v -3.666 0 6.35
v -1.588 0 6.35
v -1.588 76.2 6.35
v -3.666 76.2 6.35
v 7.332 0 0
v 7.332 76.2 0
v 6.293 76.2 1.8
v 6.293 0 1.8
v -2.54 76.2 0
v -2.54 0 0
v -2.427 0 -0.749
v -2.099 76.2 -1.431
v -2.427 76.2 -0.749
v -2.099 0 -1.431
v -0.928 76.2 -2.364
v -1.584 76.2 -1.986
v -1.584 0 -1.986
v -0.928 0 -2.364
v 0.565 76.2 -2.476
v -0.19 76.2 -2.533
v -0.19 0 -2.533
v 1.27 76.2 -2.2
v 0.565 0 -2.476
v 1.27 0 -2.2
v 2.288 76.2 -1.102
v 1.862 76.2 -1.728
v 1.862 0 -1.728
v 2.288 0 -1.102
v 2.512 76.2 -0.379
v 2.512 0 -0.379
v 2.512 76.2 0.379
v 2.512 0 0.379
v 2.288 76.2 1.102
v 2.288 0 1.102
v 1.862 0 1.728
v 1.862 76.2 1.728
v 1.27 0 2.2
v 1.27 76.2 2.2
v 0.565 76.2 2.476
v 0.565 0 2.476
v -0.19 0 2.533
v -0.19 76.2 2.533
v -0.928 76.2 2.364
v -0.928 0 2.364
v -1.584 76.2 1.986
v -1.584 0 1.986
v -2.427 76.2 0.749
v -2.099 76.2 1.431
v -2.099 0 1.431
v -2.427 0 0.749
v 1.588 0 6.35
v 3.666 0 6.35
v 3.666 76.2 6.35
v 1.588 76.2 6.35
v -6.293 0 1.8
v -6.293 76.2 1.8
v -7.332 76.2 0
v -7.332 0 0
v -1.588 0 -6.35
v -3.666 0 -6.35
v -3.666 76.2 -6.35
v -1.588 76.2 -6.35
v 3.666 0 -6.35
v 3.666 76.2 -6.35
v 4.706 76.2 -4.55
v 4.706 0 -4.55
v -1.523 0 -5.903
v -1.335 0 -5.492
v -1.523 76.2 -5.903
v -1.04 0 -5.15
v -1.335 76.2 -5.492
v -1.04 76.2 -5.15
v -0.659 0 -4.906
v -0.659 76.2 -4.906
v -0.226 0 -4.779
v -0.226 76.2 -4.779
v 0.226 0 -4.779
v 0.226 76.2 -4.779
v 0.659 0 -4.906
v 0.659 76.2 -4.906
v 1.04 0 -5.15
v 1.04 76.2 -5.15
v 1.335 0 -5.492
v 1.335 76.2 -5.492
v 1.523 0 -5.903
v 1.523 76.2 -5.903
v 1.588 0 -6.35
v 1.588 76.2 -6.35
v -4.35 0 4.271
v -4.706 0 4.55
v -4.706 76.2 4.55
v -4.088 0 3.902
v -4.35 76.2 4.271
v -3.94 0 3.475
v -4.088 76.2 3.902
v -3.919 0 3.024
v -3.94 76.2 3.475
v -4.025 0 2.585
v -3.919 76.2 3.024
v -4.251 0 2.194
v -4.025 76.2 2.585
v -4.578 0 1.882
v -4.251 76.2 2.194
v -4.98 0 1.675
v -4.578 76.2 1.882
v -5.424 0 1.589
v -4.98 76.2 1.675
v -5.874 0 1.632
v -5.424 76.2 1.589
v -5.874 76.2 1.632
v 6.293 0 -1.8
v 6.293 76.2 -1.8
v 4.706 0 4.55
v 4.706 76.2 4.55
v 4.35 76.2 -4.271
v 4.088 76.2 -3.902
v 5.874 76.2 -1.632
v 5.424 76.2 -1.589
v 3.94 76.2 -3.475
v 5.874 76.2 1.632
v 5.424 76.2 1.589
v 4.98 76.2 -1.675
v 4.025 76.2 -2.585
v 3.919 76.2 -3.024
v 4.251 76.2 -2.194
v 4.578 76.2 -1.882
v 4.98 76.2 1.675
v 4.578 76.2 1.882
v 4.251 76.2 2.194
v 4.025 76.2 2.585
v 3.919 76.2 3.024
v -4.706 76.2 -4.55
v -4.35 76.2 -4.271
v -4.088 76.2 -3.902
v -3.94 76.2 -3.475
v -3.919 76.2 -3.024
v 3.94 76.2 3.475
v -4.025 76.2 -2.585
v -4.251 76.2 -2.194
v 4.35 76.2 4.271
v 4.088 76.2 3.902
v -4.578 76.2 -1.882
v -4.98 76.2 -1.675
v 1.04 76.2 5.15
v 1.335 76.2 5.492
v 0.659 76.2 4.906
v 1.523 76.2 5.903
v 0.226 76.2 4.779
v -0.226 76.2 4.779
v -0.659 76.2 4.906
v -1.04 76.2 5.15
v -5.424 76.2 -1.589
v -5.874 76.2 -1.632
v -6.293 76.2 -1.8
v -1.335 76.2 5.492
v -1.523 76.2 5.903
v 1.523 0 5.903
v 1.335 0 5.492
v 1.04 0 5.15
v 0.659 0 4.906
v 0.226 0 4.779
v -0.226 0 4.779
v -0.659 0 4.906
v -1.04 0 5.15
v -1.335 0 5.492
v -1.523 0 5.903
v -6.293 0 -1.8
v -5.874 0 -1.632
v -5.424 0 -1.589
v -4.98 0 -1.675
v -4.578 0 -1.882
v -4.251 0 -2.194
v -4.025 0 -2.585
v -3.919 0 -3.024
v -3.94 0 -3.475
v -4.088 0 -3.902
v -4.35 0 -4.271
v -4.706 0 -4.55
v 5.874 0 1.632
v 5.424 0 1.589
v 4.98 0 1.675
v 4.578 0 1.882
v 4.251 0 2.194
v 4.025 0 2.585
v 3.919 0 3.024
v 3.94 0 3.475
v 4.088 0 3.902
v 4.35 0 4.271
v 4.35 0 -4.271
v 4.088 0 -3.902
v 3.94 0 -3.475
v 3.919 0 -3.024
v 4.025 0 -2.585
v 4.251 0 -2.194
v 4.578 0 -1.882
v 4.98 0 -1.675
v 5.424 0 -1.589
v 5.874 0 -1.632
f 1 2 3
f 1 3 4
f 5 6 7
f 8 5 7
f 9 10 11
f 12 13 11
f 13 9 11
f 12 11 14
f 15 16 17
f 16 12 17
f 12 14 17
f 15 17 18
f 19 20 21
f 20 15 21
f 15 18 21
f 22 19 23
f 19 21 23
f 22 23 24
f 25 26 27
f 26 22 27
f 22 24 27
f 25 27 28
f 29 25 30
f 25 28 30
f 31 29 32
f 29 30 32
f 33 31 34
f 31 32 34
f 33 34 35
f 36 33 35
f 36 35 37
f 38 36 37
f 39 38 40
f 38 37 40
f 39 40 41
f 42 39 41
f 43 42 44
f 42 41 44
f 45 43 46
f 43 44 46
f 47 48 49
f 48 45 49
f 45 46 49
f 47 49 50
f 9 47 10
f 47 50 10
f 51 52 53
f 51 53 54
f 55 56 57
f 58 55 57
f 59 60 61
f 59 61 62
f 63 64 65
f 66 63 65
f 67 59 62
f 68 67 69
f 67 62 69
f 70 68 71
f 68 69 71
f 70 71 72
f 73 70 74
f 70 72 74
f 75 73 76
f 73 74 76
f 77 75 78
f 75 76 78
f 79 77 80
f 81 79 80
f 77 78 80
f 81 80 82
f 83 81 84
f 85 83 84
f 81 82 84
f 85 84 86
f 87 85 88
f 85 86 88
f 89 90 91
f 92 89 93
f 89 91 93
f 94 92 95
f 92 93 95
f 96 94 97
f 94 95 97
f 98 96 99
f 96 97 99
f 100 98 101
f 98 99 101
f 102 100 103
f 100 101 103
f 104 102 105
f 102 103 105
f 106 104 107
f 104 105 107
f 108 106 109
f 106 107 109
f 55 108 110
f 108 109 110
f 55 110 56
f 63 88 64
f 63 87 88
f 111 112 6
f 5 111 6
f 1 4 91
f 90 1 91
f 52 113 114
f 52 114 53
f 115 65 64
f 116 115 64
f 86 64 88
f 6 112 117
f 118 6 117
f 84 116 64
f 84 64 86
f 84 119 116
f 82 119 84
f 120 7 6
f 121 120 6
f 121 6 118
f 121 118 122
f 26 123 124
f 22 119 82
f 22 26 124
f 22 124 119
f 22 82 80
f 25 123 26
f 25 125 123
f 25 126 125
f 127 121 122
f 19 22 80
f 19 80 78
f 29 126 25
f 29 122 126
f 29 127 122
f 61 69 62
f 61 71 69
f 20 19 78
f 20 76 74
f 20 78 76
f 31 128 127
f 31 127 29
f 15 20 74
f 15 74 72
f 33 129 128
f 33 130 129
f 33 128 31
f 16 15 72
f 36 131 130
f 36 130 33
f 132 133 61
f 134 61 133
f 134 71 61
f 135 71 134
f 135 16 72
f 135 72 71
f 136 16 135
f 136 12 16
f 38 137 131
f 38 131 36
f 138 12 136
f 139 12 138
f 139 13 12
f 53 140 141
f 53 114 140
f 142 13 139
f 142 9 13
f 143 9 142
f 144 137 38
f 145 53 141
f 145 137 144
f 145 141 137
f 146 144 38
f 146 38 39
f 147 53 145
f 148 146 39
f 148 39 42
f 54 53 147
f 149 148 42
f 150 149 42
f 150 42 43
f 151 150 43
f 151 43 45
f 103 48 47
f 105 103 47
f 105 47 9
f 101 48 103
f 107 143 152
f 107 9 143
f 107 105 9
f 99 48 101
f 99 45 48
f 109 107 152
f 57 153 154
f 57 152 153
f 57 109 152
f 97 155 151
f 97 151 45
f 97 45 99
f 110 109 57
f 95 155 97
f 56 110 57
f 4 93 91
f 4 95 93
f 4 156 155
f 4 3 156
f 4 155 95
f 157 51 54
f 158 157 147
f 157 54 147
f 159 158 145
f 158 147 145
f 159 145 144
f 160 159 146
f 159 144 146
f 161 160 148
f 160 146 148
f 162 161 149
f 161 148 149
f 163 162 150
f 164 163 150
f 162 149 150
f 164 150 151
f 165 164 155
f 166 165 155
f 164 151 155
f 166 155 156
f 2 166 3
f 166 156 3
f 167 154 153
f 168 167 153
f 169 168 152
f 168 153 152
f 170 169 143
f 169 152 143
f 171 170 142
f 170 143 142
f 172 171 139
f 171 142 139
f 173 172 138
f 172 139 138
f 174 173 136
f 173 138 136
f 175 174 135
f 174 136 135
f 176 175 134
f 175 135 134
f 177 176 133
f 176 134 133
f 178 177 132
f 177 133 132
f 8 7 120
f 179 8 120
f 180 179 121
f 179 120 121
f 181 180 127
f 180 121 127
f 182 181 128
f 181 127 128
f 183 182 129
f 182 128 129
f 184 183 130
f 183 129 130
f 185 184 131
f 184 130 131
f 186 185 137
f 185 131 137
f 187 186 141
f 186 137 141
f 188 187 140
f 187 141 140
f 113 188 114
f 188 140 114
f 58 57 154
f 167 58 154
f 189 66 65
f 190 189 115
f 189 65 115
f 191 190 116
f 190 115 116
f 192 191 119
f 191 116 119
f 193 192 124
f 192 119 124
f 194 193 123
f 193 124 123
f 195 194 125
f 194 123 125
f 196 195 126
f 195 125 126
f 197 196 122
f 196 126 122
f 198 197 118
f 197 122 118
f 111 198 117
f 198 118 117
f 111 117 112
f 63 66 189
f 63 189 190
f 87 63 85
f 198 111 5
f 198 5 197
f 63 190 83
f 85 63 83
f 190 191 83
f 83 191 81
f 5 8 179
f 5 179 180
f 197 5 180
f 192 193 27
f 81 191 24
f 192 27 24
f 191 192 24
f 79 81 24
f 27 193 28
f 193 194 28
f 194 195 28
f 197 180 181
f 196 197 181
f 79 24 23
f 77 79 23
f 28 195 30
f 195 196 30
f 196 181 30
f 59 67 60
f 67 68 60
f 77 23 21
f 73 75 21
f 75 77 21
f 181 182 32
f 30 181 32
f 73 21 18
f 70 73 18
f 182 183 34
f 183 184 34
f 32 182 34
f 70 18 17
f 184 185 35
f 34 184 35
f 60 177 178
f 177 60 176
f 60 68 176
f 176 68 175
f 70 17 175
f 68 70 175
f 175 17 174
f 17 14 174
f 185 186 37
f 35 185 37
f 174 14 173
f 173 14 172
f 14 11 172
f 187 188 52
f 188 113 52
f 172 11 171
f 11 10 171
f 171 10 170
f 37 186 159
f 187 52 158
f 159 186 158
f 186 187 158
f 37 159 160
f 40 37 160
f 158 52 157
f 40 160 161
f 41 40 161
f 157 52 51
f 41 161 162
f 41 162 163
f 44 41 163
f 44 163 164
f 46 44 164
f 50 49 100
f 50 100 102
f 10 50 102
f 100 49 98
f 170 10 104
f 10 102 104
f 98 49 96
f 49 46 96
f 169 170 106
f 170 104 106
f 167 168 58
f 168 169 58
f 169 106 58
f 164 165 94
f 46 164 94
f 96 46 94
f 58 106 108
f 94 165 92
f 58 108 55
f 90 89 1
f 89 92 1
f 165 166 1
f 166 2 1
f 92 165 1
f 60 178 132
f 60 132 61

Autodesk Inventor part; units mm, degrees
ref_plane "YZ Plane" through (0, 0, 0) normal (1, 0, 0) x (0, 1, 0)
ref_plane "XZ Plane" through (0, 0, 0) normal (0, 1, 0) x (-1, 0, 0)
ref_plane "XY Plane" through (0, 0, 0) normal (0, 0, 1) x (1, 0, 0)
sketch "Sketch1" plane through (0, 0, 0) normal (0, 1, 0) x (-1, 0, 0)
  line L0 (-3.6662, 6.35) -> (3.6662, 6.35)
  line L1 (3.6662, 6.35) -> (7.3323, 0)
  line L2 (7.3323, 0) -> (3.6662, -6.35)
  line L3 (3.6662, -6.35) -> (-3.6662, -6.35)
  line L4 (-3.6662, -6.35) -> (-7.3323, 0)
  line L5 (-7.3323, 0) -> (-3.6662, 6.35)
  circle A0 centre (0, 0) radius 2.54
  dimension "d0" = 12.7
  dimension "d1" = 5.08
extrude "Extrusion1" add sketch "Sketch1" along normal blind 76.2
sketch "Sketch2" plane through (0, 76.2, 0) normal (0, 1, 0) x (1, 0, 0)
  line L0 (-3.6662, 6.35) -> (3.6662, 6.35) projected
  arc A0 (-1.5875, 6.35) -> (1.5875, 6.35) centre (0, 6.35) ccw
  line L1 (-1.5875, 6.35) -> (1.5875, 6.35)
  dimension "d4" = 1.5875
extrude "Extrusion2" cut sketch "Sketch2" against normal through all
pattern_circular "Circular Pattern1" count 6 over 360 about axis through (0, 0, 0) along (0, 1, 0) of "Extrusion2"
properties part number "BatteryStandoff" material "Aluminum-6061"
